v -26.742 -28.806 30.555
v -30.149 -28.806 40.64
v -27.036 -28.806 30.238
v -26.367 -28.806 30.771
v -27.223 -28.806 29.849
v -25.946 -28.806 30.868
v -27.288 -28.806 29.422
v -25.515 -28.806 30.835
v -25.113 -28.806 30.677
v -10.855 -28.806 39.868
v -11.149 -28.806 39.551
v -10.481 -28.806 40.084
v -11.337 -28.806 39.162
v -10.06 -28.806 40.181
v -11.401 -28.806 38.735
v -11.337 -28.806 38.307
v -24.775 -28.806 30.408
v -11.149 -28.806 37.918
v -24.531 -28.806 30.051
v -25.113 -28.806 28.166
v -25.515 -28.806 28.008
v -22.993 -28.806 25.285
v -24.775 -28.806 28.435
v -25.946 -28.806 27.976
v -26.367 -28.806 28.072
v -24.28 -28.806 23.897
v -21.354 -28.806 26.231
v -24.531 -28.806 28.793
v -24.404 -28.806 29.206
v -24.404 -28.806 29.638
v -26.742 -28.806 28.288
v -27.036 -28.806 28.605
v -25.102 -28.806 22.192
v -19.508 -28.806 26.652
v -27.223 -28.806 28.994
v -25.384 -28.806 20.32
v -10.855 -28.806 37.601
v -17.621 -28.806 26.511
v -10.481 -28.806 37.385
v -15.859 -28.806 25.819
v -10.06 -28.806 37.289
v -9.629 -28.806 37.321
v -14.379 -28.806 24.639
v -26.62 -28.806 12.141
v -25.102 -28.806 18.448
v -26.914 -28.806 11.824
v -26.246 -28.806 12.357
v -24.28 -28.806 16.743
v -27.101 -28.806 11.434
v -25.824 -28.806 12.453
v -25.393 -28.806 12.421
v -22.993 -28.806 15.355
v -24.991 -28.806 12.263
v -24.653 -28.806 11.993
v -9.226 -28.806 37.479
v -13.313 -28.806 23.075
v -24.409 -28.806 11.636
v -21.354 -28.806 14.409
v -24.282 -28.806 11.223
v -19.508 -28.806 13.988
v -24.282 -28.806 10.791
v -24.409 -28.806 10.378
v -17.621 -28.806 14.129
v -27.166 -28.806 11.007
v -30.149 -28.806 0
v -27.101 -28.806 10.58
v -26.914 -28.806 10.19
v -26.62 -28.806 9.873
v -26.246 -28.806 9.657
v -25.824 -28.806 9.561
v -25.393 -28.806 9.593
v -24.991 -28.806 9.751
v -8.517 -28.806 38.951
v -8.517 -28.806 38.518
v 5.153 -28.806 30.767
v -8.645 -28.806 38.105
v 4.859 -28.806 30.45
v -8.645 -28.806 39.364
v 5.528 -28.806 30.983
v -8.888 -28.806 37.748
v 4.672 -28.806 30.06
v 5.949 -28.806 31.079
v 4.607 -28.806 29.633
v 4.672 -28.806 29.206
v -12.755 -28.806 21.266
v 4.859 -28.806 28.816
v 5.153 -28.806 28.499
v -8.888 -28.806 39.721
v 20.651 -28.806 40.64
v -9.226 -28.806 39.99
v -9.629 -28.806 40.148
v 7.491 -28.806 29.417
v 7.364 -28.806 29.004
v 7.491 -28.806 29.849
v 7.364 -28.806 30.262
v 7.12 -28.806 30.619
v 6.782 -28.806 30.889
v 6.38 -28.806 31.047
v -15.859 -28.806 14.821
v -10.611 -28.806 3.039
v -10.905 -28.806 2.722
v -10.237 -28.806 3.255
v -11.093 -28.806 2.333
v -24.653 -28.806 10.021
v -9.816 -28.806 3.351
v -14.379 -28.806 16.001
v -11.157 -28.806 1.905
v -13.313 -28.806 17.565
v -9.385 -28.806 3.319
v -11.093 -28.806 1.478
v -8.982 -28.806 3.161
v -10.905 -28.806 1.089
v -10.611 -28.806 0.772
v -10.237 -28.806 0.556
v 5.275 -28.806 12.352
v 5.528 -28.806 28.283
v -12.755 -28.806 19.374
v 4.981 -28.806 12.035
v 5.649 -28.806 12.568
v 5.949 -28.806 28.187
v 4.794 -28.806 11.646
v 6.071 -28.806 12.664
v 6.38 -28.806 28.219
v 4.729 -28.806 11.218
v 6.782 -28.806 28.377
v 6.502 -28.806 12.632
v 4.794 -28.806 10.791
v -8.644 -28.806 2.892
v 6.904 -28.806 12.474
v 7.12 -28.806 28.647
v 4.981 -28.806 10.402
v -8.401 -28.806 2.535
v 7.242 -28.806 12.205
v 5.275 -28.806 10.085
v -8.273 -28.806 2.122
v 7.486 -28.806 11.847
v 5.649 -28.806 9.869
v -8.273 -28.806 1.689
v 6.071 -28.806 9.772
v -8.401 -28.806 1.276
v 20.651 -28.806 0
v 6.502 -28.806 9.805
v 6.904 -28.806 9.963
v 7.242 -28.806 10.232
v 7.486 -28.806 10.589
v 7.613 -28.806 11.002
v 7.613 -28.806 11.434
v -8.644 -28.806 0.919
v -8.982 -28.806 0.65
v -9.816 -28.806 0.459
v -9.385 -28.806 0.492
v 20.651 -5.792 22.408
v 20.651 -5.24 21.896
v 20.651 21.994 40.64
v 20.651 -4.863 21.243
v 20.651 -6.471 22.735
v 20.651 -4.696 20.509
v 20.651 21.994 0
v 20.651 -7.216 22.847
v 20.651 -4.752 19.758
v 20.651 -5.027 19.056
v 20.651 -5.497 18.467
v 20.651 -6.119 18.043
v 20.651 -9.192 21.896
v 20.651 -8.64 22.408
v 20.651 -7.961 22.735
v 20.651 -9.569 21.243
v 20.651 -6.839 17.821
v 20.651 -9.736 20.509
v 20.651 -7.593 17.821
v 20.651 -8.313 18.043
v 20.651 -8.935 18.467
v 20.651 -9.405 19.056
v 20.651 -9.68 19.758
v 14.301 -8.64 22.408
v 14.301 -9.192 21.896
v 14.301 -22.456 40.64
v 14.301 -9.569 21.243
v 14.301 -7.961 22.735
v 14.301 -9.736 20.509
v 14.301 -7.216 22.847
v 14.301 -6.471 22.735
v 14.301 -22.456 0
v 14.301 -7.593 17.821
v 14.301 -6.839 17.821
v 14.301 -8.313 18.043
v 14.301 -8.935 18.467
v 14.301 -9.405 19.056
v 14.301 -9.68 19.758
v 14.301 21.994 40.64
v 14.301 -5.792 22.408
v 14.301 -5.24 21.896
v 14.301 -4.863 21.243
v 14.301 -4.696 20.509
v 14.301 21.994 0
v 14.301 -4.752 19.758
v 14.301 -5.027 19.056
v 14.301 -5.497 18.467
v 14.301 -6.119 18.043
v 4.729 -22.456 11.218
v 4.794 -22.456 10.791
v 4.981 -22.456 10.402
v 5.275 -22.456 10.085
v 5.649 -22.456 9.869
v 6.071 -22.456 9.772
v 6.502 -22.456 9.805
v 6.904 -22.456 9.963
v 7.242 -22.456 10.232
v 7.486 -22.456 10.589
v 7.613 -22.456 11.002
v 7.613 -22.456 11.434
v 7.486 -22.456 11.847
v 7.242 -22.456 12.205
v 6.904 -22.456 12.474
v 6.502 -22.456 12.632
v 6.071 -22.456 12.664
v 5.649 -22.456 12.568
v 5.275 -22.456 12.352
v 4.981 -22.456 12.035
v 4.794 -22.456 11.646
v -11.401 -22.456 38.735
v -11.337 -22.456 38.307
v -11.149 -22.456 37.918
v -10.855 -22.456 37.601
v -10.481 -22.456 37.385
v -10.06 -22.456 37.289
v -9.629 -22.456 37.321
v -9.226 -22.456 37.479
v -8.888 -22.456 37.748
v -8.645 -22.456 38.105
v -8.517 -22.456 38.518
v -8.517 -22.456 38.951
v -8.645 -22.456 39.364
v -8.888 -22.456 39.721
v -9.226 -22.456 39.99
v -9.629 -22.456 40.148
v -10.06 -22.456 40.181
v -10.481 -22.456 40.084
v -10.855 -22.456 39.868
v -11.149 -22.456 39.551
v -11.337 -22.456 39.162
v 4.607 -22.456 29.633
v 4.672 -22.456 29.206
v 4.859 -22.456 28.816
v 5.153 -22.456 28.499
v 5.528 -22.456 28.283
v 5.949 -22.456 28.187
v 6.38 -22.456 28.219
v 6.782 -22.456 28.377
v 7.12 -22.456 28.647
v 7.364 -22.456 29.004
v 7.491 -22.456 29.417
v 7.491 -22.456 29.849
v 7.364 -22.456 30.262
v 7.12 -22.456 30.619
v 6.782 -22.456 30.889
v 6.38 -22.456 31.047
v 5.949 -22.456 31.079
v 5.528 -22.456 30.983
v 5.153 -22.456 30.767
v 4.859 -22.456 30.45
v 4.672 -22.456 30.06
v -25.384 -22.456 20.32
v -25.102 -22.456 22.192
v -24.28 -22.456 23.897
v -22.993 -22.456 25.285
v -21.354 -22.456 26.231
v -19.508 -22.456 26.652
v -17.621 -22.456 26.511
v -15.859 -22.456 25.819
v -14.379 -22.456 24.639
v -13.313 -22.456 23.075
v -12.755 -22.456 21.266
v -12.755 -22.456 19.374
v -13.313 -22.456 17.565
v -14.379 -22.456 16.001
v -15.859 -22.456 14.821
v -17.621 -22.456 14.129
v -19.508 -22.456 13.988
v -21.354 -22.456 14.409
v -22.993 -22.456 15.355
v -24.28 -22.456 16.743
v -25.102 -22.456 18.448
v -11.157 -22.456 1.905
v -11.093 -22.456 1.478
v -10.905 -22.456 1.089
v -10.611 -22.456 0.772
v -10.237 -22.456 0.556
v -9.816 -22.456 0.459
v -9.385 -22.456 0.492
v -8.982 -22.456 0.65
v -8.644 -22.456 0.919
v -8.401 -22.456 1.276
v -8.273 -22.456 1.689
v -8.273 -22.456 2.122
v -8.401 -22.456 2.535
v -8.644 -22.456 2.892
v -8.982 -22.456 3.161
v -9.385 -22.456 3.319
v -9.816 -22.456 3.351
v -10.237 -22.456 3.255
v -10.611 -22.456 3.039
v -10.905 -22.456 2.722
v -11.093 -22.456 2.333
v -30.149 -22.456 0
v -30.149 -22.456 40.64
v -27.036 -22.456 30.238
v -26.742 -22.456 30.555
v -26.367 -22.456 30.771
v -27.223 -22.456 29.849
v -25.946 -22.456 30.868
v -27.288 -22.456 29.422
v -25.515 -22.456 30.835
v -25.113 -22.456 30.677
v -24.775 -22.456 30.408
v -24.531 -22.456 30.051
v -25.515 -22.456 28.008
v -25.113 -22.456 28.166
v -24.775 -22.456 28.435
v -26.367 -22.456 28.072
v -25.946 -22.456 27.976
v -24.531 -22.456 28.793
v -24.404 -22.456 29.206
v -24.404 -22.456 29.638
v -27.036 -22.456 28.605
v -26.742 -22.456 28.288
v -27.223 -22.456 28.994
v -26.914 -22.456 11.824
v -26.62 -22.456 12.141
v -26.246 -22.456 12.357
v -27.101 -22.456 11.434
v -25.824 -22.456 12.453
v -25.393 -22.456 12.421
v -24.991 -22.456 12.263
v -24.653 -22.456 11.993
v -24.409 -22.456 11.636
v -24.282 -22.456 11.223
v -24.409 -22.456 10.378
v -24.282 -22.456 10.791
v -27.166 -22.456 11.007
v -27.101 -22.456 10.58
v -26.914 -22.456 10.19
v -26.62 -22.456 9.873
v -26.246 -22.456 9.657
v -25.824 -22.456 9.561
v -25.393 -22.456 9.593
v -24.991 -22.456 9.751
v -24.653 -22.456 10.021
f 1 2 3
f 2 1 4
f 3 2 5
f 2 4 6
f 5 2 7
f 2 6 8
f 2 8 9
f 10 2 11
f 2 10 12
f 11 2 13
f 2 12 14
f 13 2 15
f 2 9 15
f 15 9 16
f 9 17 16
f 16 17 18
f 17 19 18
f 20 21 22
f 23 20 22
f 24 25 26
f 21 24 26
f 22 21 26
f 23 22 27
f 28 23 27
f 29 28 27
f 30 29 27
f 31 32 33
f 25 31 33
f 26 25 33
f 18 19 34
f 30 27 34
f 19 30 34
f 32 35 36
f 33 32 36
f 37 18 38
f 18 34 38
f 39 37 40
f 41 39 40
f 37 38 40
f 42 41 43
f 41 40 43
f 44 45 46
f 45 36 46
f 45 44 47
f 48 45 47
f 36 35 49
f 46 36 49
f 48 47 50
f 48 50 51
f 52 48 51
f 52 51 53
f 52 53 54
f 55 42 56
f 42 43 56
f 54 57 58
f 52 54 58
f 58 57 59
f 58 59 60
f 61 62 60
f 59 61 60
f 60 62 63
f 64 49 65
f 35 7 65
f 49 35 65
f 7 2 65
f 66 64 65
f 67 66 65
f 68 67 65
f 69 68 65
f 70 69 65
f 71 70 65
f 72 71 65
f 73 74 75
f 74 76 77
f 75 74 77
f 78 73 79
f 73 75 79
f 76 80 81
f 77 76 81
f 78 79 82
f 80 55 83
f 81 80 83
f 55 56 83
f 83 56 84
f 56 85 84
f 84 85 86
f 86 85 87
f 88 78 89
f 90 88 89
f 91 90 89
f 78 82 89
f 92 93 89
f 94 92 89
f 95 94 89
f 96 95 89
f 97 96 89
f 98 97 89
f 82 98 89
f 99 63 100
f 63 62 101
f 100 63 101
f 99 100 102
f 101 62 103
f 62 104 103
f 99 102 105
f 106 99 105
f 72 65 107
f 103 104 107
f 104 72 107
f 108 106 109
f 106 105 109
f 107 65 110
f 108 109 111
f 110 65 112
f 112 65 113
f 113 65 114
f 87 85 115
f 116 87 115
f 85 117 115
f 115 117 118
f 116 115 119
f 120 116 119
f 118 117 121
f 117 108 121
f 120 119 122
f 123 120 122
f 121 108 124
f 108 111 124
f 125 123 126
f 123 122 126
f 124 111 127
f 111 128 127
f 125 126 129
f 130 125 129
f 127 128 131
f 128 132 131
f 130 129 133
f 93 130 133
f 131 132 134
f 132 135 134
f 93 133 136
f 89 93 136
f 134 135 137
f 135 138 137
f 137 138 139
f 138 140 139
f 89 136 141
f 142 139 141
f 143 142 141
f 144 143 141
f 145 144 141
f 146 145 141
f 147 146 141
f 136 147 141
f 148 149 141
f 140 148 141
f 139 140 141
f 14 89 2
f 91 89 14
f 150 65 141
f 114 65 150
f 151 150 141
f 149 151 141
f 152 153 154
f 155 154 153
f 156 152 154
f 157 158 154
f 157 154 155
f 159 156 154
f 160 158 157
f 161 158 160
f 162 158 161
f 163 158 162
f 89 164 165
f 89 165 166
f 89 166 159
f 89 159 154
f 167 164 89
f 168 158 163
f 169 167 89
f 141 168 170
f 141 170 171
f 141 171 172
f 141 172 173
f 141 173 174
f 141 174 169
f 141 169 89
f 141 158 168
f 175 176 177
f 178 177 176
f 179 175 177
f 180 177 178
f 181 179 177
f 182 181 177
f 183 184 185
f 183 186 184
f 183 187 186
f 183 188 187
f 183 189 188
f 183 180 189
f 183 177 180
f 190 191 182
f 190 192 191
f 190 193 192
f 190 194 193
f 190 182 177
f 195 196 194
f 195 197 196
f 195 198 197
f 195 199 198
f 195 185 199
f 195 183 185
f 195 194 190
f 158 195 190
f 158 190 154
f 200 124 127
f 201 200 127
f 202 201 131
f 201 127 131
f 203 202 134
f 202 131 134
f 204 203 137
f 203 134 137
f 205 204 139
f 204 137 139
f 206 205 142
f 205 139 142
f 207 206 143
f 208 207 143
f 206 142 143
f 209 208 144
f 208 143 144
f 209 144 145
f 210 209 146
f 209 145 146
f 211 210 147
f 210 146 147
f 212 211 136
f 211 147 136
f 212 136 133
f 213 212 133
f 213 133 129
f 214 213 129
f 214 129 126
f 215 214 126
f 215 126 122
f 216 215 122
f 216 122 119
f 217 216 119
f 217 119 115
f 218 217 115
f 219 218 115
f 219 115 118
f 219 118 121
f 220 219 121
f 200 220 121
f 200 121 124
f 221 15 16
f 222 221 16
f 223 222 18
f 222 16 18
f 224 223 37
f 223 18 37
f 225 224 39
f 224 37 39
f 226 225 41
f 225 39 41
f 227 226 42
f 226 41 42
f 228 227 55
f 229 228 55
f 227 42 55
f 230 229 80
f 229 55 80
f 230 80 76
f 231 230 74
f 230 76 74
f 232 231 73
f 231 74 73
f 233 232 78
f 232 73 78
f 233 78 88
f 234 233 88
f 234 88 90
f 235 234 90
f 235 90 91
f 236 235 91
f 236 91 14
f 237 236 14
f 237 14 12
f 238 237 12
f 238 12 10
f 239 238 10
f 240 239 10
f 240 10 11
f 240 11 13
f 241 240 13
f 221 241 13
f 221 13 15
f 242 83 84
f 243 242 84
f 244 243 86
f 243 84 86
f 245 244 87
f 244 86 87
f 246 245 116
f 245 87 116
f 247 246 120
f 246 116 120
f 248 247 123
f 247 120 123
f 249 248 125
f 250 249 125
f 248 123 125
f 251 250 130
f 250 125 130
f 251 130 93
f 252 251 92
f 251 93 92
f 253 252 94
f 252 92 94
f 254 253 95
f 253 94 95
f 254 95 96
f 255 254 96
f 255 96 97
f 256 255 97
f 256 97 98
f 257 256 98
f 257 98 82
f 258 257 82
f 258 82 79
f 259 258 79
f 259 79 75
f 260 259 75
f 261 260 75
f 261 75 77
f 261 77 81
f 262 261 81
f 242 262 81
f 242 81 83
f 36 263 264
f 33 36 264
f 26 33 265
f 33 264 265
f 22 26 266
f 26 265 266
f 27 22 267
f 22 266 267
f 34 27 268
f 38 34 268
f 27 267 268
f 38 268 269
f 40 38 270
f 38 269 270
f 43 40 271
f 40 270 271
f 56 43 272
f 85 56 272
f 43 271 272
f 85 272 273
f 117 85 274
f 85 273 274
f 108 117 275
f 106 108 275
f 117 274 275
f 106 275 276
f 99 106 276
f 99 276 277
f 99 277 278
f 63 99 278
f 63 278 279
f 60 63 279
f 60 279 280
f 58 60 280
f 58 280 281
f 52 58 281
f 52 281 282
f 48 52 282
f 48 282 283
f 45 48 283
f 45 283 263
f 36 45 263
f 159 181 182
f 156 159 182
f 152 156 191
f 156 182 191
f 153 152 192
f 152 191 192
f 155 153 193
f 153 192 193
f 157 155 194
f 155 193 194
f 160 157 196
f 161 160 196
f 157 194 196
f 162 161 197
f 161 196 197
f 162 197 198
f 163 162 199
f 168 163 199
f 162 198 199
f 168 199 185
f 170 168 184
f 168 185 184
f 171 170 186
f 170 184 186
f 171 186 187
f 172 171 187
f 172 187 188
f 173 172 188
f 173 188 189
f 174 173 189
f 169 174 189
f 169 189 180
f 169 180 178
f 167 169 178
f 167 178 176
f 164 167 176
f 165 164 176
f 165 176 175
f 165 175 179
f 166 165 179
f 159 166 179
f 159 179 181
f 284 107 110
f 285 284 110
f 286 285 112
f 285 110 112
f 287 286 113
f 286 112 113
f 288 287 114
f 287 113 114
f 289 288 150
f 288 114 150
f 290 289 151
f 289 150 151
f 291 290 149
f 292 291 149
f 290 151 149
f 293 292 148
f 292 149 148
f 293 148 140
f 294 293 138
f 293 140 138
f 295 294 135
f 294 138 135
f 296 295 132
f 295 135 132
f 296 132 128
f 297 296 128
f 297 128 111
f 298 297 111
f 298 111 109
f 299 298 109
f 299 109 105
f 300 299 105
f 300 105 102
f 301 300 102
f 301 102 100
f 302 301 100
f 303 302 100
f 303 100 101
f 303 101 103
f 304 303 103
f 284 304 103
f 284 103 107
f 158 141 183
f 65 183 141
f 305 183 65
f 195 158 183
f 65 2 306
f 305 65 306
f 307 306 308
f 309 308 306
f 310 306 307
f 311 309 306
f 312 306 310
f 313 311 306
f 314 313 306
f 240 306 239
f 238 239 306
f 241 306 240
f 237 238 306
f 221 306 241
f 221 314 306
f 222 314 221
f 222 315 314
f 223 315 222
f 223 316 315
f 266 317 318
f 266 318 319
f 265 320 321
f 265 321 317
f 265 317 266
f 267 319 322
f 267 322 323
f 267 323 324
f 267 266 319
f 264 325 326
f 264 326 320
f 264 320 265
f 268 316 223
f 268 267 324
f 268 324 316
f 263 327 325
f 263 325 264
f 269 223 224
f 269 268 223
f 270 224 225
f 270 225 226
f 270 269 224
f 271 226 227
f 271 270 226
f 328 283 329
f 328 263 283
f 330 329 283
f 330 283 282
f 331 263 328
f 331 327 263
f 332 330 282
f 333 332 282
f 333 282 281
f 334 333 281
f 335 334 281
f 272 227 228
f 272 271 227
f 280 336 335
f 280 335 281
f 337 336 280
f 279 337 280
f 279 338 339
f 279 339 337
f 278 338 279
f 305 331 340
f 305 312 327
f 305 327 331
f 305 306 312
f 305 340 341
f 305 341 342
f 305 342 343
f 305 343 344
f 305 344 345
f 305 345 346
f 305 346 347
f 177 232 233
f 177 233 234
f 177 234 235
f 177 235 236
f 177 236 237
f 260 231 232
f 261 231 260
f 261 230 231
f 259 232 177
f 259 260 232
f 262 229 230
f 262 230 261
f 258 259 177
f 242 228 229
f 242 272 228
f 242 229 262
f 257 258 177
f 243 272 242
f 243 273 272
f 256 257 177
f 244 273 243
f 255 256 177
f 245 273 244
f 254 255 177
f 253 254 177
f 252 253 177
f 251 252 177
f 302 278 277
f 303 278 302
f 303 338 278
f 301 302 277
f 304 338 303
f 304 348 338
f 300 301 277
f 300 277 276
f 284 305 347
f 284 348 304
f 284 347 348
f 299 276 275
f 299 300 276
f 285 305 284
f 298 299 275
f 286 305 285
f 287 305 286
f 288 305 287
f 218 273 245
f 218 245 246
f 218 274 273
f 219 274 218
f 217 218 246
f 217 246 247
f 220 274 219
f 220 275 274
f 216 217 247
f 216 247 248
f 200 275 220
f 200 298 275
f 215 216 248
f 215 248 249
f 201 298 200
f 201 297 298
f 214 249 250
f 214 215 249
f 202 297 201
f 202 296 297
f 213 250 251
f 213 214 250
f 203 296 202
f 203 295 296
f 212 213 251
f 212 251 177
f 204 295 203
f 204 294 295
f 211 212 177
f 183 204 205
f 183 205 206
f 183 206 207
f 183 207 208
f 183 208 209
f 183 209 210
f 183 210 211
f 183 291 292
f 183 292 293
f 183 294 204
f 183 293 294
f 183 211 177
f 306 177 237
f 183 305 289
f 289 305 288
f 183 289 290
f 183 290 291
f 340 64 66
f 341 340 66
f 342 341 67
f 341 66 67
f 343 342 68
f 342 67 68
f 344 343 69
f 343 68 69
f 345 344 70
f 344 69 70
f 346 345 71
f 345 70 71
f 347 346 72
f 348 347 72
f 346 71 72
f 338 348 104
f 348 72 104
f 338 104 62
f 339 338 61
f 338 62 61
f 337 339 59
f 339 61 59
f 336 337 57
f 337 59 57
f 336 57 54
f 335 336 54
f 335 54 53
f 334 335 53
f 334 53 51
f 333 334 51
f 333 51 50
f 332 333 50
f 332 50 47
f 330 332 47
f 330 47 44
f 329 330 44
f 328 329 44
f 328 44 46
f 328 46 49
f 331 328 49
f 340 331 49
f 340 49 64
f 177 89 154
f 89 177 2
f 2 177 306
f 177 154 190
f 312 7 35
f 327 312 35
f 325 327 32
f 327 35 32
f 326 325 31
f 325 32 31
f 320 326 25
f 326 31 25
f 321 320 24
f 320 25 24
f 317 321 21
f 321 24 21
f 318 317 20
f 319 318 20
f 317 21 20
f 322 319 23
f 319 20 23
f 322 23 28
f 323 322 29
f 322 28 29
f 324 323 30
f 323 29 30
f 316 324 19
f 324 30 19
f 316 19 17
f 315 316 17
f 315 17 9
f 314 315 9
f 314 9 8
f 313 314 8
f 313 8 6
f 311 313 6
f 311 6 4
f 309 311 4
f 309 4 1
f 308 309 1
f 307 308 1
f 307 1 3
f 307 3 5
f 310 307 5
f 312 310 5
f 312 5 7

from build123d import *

# Parameters (mm, degrees)
BOSS_EXTRUDE1_DEPTH           = 40.64
F_8_0_199_DIAMETER_HOLE1_D    = 5.0546
SKETCH7_R                     = 6.35
CUT_EXTRUDE1_DEPTH            = 40.64
TAP_DRILL_FOR_M3_5X0_6_TAP1_D = 2.9


with BuildPart() as part:
    # Sketch4 → Boss-Extrude1 (new body)
    with BuildSketch(Plane.XY):
        Polygon((14.300746269, 21.994029851), (20.650746269, 21.994029851), (20.650746269, -28.805970149), (9.223880597, -28.805970149), (-30.149253731, -28.805970149), (-30.149253731, -22.455970149), (14.300746269, -22.455970149), align=None)
    extrude(amount=BOSS_EXTRUDE1_DEPTH)

    # #8 (0.199) Diameter Hole1 (through all)
    with Locations(Plane(origin=(20.650746269, 0, 0), x_dir=(0, 0, -1), z_dir=(1, 0, 0))):
        with Locations((-20.32, -7.215970149)):
            Hole(F_8_0_199_DIAMETER_HOLE1_D / 2)

    # Sketch7 → Cut-Extrude1 (cut)
    with BuildSketch(Plane(origin=(0, -22.455970149, 0), x_dir=(1, 0, 0), z_dir=(0, 1, 0))):
        with Locations(Location((-19.033752527, -20.32, 0), (0, 0, 180))):
            Circle(SKETCH7_R)
    extrude(amount=-CUT_EXTRUDE1_DEPTH, mode=Mode.SUBTRACT)

    # Tap Drill for M3.5x0.6 Tap1 (through all)
    with Locations(Plane(origin=(0, -22.455970149, 0), x_dir=(1, 0, 0), z_dir=(0, 1, 0))):
        with Locations((-25.715782321, -11.007082392), (-25.837741258, -29.421678533), (-9.951212668, -38.73459614), (-9.707294794, -1.90540386), (6.179233795, -11.218321467), (6.057274858, -29.632917608)):
            Hole(TAP_DRILL_FOR_M3_5X0_6_TAP1_D / 2)


solid = part.part
